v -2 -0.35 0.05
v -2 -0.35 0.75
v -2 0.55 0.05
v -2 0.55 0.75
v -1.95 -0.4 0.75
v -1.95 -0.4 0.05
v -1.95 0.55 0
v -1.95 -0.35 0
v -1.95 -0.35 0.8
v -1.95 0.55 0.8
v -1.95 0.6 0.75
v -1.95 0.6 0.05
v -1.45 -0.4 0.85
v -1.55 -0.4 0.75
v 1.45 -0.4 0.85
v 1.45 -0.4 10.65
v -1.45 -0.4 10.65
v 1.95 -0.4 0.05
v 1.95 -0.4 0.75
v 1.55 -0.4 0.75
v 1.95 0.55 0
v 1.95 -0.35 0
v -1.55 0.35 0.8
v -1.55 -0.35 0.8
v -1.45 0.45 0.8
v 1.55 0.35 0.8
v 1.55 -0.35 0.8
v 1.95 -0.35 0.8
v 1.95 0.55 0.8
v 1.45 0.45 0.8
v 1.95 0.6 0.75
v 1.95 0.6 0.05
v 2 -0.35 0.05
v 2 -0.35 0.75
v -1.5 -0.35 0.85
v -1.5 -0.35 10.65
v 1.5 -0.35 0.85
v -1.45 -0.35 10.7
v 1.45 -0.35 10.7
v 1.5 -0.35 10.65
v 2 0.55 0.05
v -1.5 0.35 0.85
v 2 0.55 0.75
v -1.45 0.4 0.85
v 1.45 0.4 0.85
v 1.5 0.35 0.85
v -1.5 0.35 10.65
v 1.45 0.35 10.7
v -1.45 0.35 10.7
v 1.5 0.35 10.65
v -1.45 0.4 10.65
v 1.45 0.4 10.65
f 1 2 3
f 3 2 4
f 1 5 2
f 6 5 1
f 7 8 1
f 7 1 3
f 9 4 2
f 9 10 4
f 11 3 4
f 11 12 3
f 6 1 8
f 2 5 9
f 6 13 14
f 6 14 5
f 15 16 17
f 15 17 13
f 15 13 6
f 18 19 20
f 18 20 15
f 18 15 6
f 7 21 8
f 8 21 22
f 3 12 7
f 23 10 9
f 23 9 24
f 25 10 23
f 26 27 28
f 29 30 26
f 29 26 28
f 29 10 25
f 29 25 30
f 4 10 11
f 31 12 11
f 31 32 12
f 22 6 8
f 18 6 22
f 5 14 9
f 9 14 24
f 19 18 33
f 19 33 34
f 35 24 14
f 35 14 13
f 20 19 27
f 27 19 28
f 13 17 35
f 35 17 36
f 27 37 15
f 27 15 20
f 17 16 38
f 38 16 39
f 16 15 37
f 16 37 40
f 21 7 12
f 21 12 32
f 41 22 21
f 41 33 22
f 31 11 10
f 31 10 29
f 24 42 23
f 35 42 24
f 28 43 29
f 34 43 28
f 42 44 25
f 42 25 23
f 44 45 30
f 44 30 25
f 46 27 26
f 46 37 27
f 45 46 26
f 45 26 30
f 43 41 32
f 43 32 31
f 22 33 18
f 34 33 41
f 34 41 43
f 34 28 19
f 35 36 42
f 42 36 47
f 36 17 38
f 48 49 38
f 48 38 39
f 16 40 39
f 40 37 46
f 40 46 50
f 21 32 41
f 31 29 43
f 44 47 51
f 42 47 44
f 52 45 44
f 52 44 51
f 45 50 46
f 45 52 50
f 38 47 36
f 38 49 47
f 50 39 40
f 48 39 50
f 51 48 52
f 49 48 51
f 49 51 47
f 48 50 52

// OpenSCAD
// Generated by spec/build_parent_hand_service.py --service-retrofit; edit scad/lib/parent_service_retrofit.py.
polyhedron(points=[[-2.0, -0.3499999940395355, 0.05000000074505806], [-2.0, -0.3499999940395355, 0.75], [-2.0, 0.550000011920929, 0.05000000074505806], [-2.0, 0.550000011920929, 0.75], [-1.9500000476837158, -0.4000000059604645, 0.75], [-1.9500000476837158, -0.4000000059604645, 0.05000000074505806], [-1.9500000476837158, 0.550000011920929, 0.0], [-1.9500000476837158, -0.3499999940395355, 0.0], [-1.9500000476837158, -0.3499999940395355, 0.800000011920929], [-1.9500000476837158, 0.550000011920929, 0.800000011920929], [-1.9500000476837158, 0.6000000238418579, 0.75], [-1.9500000476837158, 0.6000000238418579, 0.05000000074505806], [-1.4500000476837158, -0.4000000059604645, 0.8500000238418579], [-1.5499999523162842, -0.4000000059604645, 0.75], [1.4500000476837158, -0.4000000059604645, 0.8500000238418579], [1.4500000476837158, -0.4000000059604645, 10.649999618530273], [-1.4500000476837158, -0.4000000059604645, 10.649999618530273], [1.9500000476837158, -0.4000000059604645, 0.05000000074505806], [1.9500000476837158, -0.4000000059604645, 0.75], [1.5499999523162842, -0.4000000059604645, 0.75], [1.9500000476837158, 0.550000011920929, 0.0], [1.9500000476837158, -0.3499999940395355, 0.0], [-1.5499999523162842, 0.3499999940395355, 0.800000011920929], [-1.5499999523162842, -0.3499999940395355, 0.800000011920929], [-1.4500000476837158, 0.44999998807907104, 0.800000011920929], [1.5499999523162842, 0.3499999940395355, 0.800000011920929], [1.5499999523162842, -0.3499999940395355, 0.800000011920929], [1.9500000476837158, -0.3499999940395355, 0.800000011920929], [1.9500000476837158, 0.550000011920929, 0.800000011920929], [1.4500000476837158, 0.44999998807907104, 0.800000011920929], [1.9500000476837158, 0.6000000238418579, 0.75], [1.9500000476837158, 0.6000000238418579, 0.05000000074505806], [2.0, -0.3499999940395355, 0.05000000074505806], [2.0, -0.3499999940395355, 0.75], [-1.5, -0.3499999940395355, 0.8500000238418579], [-1.5, -0.3499999940395355, 10.649999618530273], [1.5, -0.3499999940395355, 0.8500000238418579], [-1.4500000476837158, -0.3499999940395355, 10.699999809265137], [1.4500000476837158, -0.3499999940395355, 10.699999809265137], [1.5, -0.3499999940395355, 10.649999618530273], [2.0, 0.550000011920929, 0.05000000074505806], [-1.5, 0.3499999940395355, 0.8500000238418579], [2.0, 0.550000011920929, 0.75], [-1.4500000476837158, 0.4000000059604645, 0.8500000238418579], [1.4500000476837158, 0.4000000059604645, 0.8500000238418579], [1.5, 0.3499999940395355, 0.8500000238418579], [-1.5, 0.3499999940395355, 10.649999618530273], [1.4500000476837158, 0.3499999940395355, 10.699999809265137], [-1.4500000476837158, 0.3499999940395355, 10.699999809265137], [1.5, 0.3499999940395355, 10.649999618530273], [-1.4500000476837158, 0.4000000059604645, 10.649999618530273], [1.4500000476837158, 0.4000000059604645, 10.649999618530273]],faces=[[2, 1, 0], [3, 1, 2], [1, 4, 0], [0, 4, 5], [0, 7, 6], [2, 0, 6], [1, 3, 8], [3, 9, 8], [3, 2, 10], [2, 11, 10], [7, 0, 5], [8, 4, 1], [13, 12, 5], [4, 13, 5], [16, 15, 14], [12, 16, 14], [5, 12, 14], [19, 18, 17], [14, 19, 17], [5, 14, 17], [7, 20, 6], [21, 20, 7], [6, 11, 2], [8, 9, 22], [23, 8, 22], [22, 9, 24], [27, 26, 25], [25, 29, 28], [27, 25, 28], [24, 9, 28], [29, 24, 28], [10, 9, 3], [10, 11, 30], [11, 31, 30], [7, 5, 21], [21, 5, 17], [8, 13, 4], [23, 13, 8], [32, 17, 18], [33, 32, 18], [13, 23, 34], [12, 13, 34], [26, 18, 19], [27, 18, 26], [34, 16, 12], [35, 16, 34], [14, 36, 26], [19, 14, 26], [37, 15, 16], [38, 15, 37], [36, 14, 15], [39, 36, 15], [11, 6, 20], [31, 11, 20], [20, 21, 40], [21, 32, 40], [9, 10, 30], [28, 9, 30], [22, 41, 23], [23, 41, 34], [28, 42, 27], [27, 42, 33], [24, 43, 41], [22, 24, 41], [29, 44, 43], [24, 29, 43], [25, 26, 45], [26, 36, 45], [25, 45, 44], [29, 25, 44], [31, 40, 42], [30, 31, 42], [17, 32, 21], [40, 32, 33], [42, 40, 33], [18, 27, 33], [41, 35, 34], [46, 35, 41], [37, 16, 35], [37, 48, 47], [38, 37, 47], [38, 39, 15], [45, 36, 39], [49, 45, 39], [40, 31, 20], [42, 28, 30], [50, 46, 43], [43, 46, 41], [43, 44, 51], [50, 43, 51], [45, 49, 44], [49, 51, 44], [35, 46, 37], [46, 48, 37], [39, 38, 49], [49, 38, 47], [51, 47, 50], [50, 47, 48], [46, 50, 48], [51, 49, 47]],convexity=10);
